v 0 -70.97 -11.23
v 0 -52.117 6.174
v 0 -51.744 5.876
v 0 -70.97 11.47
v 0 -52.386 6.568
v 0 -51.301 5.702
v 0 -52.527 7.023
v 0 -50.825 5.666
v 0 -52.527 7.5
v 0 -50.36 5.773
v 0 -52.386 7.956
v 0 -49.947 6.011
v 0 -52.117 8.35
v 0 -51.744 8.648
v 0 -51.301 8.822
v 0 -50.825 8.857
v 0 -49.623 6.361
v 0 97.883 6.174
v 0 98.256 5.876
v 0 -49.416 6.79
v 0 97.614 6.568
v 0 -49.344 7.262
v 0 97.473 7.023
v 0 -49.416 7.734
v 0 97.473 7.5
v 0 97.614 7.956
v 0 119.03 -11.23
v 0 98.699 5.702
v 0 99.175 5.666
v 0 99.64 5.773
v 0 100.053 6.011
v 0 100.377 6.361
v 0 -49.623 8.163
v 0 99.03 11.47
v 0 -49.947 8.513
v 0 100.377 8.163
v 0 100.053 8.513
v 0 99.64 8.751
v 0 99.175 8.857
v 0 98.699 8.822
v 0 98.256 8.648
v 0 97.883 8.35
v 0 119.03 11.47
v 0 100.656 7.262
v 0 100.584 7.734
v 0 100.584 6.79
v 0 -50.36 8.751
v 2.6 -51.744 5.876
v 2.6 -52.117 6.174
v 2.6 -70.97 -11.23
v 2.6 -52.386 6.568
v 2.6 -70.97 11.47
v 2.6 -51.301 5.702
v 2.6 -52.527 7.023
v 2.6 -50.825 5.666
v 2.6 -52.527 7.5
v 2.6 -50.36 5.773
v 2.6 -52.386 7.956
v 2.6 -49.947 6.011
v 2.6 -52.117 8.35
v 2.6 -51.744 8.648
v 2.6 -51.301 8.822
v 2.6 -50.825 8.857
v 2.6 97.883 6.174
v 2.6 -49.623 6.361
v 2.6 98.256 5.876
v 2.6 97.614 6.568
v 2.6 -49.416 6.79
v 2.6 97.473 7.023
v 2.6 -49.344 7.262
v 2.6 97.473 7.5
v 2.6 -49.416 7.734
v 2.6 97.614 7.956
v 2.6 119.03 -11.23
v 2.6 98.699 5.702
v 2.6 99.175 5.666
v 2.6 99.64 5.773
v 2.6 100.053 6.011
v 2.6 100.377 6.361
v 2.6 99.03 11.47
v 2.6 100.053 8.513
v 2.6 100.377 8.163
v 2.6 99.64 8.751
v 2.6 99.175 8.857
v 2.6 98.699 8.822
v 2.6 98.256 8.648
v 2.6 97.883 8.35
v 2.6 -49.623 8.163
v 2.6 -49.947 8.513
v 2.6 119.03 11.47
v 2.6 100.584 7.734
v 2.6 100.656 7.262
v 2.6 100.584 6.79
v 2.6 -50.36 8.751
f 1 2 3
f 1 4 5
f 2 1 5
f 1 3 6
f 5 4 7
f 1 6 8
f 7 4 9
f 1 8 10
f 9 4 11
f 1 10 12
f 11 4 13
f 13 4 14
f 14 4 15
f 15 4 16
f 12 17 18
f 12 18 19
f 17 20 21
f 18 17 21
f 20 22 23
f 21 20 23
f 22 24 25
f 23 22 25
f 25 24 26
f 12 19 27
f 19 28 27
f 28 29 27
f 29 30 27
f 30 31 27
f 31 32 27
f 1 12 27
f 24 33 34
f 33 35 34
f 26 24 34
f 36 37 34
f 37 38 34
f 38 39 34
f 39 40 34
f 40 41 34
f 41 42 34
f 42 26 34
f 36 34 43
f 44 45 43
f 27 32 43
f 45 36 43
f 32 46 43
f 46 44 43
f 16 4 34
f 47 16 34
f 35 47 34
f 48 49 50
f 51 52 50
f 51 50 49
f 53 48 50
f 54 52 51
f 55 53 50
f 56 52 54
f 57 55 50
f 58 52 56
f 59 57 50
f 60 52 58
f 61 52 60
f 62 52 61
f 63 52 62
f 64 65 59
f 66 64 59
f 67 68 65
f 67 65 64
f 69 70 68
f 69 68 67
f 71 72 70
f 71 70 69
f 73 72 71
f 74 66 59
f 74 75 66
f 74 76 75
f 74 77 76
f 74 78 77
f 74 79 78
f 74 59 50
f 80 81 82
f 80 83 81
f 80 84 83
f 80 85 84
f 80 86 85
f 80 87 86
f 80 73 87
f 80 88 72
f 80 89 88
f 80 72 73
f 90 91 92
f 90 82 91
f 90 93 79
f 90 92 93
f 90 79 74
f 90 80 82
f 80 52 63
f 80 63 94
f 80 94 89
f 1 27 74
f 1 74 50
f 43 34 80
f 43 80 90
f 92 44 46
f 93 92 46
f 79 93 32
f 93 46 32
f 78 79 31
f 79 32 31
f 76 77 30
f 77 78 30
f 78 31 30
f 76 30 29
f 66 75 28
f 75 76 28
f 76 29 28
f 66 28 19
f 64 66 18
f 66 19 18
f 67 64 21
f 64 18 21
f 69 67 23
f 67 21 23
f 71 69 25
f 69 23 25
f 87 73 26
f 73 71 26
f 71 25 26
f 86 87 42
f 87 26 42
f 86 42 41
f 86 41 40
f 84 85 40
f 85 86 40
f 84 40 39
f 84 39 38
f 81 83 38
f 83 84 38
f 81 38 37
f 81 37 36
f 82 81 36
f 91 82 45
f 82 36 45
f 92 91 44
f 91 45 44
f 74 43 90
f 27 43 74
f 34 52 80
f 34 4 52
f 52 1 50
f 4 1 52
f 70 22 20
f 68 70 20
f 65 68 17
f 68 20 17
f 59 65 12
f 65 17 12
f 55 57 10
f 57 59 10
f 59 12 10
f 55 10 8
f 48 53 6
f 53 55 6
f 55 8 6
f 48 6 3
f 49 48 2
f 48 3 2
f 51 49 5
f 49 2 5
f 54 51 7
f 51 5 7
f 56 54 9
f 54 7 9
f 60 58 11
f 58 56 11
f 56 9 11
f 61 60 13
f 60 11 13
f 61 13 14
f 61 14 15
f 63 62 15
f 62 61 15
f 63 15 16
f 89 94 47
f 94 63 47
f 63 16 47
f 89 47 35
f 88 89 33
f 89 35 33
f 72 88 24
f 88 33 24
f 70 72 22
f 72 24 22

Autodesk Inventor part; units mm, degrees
ref_plane "YZ Plane" through (0, 0, 0) normal (1, 0, 0) x (0, 1, 0)
ref_plane "XZ Plane" through (0, 0, 0) normal (0, 1, 0) x (-1, 0, 0)
ref_plane "XY Plane" through (0, 0, 0) normal (0, 0, 1) x (1, 0, 0)
sketch "Sketch1" plane through (0, 0, 0) normal (1, 0, 0) x (0, 1, 0)
  circle A0 centre (99.0555, 7.2619) radius 1.6
  line L0 (99.0555, 7.2619) -> (-50.9445, 7.2619) construction
  line L1 (99.0555, 7.2619) -> (249.0555, 7.2619) construction
  circle A1 centre (-50.9445, 7.2619) radius 1.6
  circle A2 centre (99.0555, 7.2619) radius 1.6
  line L2 (99.0305, 11.4695) -> (119.0305, 11.4695)
  line L3 (119.0305, 11.4695) -> (119.0305, -11.2305)
  line L4 (119.0305, 11.4695) -> (141.7305, 11.4695) construction
  line L5 (119.0305, -11.2305) -> (-70.9695, -11.2305)
  line L6 (-70.9695, -11.2305) -> (-70.9695, 11.4695)
  line L7 (-70.9695, 11.4695) -> (99.0305, 11.4695)
  point P0 (0, 0)
  dimension "d0" = 150
  dimension "d1" = 180
  dimension "d2" = 3.2
  dimension "d3" = 3.2
  dimension "d4" = 20
  dimension "d5" = 22.7
  dimension "d6" = 90
  dimension "d7" = 190
  dimension "d8" = 90
  dimension "d9" = 22.7
  dimension "d10" = 90
extrude "Extrusion1" add sketch "Sketch1" along normal blind 2.6
properties part number "Template-Fixture-Side"
